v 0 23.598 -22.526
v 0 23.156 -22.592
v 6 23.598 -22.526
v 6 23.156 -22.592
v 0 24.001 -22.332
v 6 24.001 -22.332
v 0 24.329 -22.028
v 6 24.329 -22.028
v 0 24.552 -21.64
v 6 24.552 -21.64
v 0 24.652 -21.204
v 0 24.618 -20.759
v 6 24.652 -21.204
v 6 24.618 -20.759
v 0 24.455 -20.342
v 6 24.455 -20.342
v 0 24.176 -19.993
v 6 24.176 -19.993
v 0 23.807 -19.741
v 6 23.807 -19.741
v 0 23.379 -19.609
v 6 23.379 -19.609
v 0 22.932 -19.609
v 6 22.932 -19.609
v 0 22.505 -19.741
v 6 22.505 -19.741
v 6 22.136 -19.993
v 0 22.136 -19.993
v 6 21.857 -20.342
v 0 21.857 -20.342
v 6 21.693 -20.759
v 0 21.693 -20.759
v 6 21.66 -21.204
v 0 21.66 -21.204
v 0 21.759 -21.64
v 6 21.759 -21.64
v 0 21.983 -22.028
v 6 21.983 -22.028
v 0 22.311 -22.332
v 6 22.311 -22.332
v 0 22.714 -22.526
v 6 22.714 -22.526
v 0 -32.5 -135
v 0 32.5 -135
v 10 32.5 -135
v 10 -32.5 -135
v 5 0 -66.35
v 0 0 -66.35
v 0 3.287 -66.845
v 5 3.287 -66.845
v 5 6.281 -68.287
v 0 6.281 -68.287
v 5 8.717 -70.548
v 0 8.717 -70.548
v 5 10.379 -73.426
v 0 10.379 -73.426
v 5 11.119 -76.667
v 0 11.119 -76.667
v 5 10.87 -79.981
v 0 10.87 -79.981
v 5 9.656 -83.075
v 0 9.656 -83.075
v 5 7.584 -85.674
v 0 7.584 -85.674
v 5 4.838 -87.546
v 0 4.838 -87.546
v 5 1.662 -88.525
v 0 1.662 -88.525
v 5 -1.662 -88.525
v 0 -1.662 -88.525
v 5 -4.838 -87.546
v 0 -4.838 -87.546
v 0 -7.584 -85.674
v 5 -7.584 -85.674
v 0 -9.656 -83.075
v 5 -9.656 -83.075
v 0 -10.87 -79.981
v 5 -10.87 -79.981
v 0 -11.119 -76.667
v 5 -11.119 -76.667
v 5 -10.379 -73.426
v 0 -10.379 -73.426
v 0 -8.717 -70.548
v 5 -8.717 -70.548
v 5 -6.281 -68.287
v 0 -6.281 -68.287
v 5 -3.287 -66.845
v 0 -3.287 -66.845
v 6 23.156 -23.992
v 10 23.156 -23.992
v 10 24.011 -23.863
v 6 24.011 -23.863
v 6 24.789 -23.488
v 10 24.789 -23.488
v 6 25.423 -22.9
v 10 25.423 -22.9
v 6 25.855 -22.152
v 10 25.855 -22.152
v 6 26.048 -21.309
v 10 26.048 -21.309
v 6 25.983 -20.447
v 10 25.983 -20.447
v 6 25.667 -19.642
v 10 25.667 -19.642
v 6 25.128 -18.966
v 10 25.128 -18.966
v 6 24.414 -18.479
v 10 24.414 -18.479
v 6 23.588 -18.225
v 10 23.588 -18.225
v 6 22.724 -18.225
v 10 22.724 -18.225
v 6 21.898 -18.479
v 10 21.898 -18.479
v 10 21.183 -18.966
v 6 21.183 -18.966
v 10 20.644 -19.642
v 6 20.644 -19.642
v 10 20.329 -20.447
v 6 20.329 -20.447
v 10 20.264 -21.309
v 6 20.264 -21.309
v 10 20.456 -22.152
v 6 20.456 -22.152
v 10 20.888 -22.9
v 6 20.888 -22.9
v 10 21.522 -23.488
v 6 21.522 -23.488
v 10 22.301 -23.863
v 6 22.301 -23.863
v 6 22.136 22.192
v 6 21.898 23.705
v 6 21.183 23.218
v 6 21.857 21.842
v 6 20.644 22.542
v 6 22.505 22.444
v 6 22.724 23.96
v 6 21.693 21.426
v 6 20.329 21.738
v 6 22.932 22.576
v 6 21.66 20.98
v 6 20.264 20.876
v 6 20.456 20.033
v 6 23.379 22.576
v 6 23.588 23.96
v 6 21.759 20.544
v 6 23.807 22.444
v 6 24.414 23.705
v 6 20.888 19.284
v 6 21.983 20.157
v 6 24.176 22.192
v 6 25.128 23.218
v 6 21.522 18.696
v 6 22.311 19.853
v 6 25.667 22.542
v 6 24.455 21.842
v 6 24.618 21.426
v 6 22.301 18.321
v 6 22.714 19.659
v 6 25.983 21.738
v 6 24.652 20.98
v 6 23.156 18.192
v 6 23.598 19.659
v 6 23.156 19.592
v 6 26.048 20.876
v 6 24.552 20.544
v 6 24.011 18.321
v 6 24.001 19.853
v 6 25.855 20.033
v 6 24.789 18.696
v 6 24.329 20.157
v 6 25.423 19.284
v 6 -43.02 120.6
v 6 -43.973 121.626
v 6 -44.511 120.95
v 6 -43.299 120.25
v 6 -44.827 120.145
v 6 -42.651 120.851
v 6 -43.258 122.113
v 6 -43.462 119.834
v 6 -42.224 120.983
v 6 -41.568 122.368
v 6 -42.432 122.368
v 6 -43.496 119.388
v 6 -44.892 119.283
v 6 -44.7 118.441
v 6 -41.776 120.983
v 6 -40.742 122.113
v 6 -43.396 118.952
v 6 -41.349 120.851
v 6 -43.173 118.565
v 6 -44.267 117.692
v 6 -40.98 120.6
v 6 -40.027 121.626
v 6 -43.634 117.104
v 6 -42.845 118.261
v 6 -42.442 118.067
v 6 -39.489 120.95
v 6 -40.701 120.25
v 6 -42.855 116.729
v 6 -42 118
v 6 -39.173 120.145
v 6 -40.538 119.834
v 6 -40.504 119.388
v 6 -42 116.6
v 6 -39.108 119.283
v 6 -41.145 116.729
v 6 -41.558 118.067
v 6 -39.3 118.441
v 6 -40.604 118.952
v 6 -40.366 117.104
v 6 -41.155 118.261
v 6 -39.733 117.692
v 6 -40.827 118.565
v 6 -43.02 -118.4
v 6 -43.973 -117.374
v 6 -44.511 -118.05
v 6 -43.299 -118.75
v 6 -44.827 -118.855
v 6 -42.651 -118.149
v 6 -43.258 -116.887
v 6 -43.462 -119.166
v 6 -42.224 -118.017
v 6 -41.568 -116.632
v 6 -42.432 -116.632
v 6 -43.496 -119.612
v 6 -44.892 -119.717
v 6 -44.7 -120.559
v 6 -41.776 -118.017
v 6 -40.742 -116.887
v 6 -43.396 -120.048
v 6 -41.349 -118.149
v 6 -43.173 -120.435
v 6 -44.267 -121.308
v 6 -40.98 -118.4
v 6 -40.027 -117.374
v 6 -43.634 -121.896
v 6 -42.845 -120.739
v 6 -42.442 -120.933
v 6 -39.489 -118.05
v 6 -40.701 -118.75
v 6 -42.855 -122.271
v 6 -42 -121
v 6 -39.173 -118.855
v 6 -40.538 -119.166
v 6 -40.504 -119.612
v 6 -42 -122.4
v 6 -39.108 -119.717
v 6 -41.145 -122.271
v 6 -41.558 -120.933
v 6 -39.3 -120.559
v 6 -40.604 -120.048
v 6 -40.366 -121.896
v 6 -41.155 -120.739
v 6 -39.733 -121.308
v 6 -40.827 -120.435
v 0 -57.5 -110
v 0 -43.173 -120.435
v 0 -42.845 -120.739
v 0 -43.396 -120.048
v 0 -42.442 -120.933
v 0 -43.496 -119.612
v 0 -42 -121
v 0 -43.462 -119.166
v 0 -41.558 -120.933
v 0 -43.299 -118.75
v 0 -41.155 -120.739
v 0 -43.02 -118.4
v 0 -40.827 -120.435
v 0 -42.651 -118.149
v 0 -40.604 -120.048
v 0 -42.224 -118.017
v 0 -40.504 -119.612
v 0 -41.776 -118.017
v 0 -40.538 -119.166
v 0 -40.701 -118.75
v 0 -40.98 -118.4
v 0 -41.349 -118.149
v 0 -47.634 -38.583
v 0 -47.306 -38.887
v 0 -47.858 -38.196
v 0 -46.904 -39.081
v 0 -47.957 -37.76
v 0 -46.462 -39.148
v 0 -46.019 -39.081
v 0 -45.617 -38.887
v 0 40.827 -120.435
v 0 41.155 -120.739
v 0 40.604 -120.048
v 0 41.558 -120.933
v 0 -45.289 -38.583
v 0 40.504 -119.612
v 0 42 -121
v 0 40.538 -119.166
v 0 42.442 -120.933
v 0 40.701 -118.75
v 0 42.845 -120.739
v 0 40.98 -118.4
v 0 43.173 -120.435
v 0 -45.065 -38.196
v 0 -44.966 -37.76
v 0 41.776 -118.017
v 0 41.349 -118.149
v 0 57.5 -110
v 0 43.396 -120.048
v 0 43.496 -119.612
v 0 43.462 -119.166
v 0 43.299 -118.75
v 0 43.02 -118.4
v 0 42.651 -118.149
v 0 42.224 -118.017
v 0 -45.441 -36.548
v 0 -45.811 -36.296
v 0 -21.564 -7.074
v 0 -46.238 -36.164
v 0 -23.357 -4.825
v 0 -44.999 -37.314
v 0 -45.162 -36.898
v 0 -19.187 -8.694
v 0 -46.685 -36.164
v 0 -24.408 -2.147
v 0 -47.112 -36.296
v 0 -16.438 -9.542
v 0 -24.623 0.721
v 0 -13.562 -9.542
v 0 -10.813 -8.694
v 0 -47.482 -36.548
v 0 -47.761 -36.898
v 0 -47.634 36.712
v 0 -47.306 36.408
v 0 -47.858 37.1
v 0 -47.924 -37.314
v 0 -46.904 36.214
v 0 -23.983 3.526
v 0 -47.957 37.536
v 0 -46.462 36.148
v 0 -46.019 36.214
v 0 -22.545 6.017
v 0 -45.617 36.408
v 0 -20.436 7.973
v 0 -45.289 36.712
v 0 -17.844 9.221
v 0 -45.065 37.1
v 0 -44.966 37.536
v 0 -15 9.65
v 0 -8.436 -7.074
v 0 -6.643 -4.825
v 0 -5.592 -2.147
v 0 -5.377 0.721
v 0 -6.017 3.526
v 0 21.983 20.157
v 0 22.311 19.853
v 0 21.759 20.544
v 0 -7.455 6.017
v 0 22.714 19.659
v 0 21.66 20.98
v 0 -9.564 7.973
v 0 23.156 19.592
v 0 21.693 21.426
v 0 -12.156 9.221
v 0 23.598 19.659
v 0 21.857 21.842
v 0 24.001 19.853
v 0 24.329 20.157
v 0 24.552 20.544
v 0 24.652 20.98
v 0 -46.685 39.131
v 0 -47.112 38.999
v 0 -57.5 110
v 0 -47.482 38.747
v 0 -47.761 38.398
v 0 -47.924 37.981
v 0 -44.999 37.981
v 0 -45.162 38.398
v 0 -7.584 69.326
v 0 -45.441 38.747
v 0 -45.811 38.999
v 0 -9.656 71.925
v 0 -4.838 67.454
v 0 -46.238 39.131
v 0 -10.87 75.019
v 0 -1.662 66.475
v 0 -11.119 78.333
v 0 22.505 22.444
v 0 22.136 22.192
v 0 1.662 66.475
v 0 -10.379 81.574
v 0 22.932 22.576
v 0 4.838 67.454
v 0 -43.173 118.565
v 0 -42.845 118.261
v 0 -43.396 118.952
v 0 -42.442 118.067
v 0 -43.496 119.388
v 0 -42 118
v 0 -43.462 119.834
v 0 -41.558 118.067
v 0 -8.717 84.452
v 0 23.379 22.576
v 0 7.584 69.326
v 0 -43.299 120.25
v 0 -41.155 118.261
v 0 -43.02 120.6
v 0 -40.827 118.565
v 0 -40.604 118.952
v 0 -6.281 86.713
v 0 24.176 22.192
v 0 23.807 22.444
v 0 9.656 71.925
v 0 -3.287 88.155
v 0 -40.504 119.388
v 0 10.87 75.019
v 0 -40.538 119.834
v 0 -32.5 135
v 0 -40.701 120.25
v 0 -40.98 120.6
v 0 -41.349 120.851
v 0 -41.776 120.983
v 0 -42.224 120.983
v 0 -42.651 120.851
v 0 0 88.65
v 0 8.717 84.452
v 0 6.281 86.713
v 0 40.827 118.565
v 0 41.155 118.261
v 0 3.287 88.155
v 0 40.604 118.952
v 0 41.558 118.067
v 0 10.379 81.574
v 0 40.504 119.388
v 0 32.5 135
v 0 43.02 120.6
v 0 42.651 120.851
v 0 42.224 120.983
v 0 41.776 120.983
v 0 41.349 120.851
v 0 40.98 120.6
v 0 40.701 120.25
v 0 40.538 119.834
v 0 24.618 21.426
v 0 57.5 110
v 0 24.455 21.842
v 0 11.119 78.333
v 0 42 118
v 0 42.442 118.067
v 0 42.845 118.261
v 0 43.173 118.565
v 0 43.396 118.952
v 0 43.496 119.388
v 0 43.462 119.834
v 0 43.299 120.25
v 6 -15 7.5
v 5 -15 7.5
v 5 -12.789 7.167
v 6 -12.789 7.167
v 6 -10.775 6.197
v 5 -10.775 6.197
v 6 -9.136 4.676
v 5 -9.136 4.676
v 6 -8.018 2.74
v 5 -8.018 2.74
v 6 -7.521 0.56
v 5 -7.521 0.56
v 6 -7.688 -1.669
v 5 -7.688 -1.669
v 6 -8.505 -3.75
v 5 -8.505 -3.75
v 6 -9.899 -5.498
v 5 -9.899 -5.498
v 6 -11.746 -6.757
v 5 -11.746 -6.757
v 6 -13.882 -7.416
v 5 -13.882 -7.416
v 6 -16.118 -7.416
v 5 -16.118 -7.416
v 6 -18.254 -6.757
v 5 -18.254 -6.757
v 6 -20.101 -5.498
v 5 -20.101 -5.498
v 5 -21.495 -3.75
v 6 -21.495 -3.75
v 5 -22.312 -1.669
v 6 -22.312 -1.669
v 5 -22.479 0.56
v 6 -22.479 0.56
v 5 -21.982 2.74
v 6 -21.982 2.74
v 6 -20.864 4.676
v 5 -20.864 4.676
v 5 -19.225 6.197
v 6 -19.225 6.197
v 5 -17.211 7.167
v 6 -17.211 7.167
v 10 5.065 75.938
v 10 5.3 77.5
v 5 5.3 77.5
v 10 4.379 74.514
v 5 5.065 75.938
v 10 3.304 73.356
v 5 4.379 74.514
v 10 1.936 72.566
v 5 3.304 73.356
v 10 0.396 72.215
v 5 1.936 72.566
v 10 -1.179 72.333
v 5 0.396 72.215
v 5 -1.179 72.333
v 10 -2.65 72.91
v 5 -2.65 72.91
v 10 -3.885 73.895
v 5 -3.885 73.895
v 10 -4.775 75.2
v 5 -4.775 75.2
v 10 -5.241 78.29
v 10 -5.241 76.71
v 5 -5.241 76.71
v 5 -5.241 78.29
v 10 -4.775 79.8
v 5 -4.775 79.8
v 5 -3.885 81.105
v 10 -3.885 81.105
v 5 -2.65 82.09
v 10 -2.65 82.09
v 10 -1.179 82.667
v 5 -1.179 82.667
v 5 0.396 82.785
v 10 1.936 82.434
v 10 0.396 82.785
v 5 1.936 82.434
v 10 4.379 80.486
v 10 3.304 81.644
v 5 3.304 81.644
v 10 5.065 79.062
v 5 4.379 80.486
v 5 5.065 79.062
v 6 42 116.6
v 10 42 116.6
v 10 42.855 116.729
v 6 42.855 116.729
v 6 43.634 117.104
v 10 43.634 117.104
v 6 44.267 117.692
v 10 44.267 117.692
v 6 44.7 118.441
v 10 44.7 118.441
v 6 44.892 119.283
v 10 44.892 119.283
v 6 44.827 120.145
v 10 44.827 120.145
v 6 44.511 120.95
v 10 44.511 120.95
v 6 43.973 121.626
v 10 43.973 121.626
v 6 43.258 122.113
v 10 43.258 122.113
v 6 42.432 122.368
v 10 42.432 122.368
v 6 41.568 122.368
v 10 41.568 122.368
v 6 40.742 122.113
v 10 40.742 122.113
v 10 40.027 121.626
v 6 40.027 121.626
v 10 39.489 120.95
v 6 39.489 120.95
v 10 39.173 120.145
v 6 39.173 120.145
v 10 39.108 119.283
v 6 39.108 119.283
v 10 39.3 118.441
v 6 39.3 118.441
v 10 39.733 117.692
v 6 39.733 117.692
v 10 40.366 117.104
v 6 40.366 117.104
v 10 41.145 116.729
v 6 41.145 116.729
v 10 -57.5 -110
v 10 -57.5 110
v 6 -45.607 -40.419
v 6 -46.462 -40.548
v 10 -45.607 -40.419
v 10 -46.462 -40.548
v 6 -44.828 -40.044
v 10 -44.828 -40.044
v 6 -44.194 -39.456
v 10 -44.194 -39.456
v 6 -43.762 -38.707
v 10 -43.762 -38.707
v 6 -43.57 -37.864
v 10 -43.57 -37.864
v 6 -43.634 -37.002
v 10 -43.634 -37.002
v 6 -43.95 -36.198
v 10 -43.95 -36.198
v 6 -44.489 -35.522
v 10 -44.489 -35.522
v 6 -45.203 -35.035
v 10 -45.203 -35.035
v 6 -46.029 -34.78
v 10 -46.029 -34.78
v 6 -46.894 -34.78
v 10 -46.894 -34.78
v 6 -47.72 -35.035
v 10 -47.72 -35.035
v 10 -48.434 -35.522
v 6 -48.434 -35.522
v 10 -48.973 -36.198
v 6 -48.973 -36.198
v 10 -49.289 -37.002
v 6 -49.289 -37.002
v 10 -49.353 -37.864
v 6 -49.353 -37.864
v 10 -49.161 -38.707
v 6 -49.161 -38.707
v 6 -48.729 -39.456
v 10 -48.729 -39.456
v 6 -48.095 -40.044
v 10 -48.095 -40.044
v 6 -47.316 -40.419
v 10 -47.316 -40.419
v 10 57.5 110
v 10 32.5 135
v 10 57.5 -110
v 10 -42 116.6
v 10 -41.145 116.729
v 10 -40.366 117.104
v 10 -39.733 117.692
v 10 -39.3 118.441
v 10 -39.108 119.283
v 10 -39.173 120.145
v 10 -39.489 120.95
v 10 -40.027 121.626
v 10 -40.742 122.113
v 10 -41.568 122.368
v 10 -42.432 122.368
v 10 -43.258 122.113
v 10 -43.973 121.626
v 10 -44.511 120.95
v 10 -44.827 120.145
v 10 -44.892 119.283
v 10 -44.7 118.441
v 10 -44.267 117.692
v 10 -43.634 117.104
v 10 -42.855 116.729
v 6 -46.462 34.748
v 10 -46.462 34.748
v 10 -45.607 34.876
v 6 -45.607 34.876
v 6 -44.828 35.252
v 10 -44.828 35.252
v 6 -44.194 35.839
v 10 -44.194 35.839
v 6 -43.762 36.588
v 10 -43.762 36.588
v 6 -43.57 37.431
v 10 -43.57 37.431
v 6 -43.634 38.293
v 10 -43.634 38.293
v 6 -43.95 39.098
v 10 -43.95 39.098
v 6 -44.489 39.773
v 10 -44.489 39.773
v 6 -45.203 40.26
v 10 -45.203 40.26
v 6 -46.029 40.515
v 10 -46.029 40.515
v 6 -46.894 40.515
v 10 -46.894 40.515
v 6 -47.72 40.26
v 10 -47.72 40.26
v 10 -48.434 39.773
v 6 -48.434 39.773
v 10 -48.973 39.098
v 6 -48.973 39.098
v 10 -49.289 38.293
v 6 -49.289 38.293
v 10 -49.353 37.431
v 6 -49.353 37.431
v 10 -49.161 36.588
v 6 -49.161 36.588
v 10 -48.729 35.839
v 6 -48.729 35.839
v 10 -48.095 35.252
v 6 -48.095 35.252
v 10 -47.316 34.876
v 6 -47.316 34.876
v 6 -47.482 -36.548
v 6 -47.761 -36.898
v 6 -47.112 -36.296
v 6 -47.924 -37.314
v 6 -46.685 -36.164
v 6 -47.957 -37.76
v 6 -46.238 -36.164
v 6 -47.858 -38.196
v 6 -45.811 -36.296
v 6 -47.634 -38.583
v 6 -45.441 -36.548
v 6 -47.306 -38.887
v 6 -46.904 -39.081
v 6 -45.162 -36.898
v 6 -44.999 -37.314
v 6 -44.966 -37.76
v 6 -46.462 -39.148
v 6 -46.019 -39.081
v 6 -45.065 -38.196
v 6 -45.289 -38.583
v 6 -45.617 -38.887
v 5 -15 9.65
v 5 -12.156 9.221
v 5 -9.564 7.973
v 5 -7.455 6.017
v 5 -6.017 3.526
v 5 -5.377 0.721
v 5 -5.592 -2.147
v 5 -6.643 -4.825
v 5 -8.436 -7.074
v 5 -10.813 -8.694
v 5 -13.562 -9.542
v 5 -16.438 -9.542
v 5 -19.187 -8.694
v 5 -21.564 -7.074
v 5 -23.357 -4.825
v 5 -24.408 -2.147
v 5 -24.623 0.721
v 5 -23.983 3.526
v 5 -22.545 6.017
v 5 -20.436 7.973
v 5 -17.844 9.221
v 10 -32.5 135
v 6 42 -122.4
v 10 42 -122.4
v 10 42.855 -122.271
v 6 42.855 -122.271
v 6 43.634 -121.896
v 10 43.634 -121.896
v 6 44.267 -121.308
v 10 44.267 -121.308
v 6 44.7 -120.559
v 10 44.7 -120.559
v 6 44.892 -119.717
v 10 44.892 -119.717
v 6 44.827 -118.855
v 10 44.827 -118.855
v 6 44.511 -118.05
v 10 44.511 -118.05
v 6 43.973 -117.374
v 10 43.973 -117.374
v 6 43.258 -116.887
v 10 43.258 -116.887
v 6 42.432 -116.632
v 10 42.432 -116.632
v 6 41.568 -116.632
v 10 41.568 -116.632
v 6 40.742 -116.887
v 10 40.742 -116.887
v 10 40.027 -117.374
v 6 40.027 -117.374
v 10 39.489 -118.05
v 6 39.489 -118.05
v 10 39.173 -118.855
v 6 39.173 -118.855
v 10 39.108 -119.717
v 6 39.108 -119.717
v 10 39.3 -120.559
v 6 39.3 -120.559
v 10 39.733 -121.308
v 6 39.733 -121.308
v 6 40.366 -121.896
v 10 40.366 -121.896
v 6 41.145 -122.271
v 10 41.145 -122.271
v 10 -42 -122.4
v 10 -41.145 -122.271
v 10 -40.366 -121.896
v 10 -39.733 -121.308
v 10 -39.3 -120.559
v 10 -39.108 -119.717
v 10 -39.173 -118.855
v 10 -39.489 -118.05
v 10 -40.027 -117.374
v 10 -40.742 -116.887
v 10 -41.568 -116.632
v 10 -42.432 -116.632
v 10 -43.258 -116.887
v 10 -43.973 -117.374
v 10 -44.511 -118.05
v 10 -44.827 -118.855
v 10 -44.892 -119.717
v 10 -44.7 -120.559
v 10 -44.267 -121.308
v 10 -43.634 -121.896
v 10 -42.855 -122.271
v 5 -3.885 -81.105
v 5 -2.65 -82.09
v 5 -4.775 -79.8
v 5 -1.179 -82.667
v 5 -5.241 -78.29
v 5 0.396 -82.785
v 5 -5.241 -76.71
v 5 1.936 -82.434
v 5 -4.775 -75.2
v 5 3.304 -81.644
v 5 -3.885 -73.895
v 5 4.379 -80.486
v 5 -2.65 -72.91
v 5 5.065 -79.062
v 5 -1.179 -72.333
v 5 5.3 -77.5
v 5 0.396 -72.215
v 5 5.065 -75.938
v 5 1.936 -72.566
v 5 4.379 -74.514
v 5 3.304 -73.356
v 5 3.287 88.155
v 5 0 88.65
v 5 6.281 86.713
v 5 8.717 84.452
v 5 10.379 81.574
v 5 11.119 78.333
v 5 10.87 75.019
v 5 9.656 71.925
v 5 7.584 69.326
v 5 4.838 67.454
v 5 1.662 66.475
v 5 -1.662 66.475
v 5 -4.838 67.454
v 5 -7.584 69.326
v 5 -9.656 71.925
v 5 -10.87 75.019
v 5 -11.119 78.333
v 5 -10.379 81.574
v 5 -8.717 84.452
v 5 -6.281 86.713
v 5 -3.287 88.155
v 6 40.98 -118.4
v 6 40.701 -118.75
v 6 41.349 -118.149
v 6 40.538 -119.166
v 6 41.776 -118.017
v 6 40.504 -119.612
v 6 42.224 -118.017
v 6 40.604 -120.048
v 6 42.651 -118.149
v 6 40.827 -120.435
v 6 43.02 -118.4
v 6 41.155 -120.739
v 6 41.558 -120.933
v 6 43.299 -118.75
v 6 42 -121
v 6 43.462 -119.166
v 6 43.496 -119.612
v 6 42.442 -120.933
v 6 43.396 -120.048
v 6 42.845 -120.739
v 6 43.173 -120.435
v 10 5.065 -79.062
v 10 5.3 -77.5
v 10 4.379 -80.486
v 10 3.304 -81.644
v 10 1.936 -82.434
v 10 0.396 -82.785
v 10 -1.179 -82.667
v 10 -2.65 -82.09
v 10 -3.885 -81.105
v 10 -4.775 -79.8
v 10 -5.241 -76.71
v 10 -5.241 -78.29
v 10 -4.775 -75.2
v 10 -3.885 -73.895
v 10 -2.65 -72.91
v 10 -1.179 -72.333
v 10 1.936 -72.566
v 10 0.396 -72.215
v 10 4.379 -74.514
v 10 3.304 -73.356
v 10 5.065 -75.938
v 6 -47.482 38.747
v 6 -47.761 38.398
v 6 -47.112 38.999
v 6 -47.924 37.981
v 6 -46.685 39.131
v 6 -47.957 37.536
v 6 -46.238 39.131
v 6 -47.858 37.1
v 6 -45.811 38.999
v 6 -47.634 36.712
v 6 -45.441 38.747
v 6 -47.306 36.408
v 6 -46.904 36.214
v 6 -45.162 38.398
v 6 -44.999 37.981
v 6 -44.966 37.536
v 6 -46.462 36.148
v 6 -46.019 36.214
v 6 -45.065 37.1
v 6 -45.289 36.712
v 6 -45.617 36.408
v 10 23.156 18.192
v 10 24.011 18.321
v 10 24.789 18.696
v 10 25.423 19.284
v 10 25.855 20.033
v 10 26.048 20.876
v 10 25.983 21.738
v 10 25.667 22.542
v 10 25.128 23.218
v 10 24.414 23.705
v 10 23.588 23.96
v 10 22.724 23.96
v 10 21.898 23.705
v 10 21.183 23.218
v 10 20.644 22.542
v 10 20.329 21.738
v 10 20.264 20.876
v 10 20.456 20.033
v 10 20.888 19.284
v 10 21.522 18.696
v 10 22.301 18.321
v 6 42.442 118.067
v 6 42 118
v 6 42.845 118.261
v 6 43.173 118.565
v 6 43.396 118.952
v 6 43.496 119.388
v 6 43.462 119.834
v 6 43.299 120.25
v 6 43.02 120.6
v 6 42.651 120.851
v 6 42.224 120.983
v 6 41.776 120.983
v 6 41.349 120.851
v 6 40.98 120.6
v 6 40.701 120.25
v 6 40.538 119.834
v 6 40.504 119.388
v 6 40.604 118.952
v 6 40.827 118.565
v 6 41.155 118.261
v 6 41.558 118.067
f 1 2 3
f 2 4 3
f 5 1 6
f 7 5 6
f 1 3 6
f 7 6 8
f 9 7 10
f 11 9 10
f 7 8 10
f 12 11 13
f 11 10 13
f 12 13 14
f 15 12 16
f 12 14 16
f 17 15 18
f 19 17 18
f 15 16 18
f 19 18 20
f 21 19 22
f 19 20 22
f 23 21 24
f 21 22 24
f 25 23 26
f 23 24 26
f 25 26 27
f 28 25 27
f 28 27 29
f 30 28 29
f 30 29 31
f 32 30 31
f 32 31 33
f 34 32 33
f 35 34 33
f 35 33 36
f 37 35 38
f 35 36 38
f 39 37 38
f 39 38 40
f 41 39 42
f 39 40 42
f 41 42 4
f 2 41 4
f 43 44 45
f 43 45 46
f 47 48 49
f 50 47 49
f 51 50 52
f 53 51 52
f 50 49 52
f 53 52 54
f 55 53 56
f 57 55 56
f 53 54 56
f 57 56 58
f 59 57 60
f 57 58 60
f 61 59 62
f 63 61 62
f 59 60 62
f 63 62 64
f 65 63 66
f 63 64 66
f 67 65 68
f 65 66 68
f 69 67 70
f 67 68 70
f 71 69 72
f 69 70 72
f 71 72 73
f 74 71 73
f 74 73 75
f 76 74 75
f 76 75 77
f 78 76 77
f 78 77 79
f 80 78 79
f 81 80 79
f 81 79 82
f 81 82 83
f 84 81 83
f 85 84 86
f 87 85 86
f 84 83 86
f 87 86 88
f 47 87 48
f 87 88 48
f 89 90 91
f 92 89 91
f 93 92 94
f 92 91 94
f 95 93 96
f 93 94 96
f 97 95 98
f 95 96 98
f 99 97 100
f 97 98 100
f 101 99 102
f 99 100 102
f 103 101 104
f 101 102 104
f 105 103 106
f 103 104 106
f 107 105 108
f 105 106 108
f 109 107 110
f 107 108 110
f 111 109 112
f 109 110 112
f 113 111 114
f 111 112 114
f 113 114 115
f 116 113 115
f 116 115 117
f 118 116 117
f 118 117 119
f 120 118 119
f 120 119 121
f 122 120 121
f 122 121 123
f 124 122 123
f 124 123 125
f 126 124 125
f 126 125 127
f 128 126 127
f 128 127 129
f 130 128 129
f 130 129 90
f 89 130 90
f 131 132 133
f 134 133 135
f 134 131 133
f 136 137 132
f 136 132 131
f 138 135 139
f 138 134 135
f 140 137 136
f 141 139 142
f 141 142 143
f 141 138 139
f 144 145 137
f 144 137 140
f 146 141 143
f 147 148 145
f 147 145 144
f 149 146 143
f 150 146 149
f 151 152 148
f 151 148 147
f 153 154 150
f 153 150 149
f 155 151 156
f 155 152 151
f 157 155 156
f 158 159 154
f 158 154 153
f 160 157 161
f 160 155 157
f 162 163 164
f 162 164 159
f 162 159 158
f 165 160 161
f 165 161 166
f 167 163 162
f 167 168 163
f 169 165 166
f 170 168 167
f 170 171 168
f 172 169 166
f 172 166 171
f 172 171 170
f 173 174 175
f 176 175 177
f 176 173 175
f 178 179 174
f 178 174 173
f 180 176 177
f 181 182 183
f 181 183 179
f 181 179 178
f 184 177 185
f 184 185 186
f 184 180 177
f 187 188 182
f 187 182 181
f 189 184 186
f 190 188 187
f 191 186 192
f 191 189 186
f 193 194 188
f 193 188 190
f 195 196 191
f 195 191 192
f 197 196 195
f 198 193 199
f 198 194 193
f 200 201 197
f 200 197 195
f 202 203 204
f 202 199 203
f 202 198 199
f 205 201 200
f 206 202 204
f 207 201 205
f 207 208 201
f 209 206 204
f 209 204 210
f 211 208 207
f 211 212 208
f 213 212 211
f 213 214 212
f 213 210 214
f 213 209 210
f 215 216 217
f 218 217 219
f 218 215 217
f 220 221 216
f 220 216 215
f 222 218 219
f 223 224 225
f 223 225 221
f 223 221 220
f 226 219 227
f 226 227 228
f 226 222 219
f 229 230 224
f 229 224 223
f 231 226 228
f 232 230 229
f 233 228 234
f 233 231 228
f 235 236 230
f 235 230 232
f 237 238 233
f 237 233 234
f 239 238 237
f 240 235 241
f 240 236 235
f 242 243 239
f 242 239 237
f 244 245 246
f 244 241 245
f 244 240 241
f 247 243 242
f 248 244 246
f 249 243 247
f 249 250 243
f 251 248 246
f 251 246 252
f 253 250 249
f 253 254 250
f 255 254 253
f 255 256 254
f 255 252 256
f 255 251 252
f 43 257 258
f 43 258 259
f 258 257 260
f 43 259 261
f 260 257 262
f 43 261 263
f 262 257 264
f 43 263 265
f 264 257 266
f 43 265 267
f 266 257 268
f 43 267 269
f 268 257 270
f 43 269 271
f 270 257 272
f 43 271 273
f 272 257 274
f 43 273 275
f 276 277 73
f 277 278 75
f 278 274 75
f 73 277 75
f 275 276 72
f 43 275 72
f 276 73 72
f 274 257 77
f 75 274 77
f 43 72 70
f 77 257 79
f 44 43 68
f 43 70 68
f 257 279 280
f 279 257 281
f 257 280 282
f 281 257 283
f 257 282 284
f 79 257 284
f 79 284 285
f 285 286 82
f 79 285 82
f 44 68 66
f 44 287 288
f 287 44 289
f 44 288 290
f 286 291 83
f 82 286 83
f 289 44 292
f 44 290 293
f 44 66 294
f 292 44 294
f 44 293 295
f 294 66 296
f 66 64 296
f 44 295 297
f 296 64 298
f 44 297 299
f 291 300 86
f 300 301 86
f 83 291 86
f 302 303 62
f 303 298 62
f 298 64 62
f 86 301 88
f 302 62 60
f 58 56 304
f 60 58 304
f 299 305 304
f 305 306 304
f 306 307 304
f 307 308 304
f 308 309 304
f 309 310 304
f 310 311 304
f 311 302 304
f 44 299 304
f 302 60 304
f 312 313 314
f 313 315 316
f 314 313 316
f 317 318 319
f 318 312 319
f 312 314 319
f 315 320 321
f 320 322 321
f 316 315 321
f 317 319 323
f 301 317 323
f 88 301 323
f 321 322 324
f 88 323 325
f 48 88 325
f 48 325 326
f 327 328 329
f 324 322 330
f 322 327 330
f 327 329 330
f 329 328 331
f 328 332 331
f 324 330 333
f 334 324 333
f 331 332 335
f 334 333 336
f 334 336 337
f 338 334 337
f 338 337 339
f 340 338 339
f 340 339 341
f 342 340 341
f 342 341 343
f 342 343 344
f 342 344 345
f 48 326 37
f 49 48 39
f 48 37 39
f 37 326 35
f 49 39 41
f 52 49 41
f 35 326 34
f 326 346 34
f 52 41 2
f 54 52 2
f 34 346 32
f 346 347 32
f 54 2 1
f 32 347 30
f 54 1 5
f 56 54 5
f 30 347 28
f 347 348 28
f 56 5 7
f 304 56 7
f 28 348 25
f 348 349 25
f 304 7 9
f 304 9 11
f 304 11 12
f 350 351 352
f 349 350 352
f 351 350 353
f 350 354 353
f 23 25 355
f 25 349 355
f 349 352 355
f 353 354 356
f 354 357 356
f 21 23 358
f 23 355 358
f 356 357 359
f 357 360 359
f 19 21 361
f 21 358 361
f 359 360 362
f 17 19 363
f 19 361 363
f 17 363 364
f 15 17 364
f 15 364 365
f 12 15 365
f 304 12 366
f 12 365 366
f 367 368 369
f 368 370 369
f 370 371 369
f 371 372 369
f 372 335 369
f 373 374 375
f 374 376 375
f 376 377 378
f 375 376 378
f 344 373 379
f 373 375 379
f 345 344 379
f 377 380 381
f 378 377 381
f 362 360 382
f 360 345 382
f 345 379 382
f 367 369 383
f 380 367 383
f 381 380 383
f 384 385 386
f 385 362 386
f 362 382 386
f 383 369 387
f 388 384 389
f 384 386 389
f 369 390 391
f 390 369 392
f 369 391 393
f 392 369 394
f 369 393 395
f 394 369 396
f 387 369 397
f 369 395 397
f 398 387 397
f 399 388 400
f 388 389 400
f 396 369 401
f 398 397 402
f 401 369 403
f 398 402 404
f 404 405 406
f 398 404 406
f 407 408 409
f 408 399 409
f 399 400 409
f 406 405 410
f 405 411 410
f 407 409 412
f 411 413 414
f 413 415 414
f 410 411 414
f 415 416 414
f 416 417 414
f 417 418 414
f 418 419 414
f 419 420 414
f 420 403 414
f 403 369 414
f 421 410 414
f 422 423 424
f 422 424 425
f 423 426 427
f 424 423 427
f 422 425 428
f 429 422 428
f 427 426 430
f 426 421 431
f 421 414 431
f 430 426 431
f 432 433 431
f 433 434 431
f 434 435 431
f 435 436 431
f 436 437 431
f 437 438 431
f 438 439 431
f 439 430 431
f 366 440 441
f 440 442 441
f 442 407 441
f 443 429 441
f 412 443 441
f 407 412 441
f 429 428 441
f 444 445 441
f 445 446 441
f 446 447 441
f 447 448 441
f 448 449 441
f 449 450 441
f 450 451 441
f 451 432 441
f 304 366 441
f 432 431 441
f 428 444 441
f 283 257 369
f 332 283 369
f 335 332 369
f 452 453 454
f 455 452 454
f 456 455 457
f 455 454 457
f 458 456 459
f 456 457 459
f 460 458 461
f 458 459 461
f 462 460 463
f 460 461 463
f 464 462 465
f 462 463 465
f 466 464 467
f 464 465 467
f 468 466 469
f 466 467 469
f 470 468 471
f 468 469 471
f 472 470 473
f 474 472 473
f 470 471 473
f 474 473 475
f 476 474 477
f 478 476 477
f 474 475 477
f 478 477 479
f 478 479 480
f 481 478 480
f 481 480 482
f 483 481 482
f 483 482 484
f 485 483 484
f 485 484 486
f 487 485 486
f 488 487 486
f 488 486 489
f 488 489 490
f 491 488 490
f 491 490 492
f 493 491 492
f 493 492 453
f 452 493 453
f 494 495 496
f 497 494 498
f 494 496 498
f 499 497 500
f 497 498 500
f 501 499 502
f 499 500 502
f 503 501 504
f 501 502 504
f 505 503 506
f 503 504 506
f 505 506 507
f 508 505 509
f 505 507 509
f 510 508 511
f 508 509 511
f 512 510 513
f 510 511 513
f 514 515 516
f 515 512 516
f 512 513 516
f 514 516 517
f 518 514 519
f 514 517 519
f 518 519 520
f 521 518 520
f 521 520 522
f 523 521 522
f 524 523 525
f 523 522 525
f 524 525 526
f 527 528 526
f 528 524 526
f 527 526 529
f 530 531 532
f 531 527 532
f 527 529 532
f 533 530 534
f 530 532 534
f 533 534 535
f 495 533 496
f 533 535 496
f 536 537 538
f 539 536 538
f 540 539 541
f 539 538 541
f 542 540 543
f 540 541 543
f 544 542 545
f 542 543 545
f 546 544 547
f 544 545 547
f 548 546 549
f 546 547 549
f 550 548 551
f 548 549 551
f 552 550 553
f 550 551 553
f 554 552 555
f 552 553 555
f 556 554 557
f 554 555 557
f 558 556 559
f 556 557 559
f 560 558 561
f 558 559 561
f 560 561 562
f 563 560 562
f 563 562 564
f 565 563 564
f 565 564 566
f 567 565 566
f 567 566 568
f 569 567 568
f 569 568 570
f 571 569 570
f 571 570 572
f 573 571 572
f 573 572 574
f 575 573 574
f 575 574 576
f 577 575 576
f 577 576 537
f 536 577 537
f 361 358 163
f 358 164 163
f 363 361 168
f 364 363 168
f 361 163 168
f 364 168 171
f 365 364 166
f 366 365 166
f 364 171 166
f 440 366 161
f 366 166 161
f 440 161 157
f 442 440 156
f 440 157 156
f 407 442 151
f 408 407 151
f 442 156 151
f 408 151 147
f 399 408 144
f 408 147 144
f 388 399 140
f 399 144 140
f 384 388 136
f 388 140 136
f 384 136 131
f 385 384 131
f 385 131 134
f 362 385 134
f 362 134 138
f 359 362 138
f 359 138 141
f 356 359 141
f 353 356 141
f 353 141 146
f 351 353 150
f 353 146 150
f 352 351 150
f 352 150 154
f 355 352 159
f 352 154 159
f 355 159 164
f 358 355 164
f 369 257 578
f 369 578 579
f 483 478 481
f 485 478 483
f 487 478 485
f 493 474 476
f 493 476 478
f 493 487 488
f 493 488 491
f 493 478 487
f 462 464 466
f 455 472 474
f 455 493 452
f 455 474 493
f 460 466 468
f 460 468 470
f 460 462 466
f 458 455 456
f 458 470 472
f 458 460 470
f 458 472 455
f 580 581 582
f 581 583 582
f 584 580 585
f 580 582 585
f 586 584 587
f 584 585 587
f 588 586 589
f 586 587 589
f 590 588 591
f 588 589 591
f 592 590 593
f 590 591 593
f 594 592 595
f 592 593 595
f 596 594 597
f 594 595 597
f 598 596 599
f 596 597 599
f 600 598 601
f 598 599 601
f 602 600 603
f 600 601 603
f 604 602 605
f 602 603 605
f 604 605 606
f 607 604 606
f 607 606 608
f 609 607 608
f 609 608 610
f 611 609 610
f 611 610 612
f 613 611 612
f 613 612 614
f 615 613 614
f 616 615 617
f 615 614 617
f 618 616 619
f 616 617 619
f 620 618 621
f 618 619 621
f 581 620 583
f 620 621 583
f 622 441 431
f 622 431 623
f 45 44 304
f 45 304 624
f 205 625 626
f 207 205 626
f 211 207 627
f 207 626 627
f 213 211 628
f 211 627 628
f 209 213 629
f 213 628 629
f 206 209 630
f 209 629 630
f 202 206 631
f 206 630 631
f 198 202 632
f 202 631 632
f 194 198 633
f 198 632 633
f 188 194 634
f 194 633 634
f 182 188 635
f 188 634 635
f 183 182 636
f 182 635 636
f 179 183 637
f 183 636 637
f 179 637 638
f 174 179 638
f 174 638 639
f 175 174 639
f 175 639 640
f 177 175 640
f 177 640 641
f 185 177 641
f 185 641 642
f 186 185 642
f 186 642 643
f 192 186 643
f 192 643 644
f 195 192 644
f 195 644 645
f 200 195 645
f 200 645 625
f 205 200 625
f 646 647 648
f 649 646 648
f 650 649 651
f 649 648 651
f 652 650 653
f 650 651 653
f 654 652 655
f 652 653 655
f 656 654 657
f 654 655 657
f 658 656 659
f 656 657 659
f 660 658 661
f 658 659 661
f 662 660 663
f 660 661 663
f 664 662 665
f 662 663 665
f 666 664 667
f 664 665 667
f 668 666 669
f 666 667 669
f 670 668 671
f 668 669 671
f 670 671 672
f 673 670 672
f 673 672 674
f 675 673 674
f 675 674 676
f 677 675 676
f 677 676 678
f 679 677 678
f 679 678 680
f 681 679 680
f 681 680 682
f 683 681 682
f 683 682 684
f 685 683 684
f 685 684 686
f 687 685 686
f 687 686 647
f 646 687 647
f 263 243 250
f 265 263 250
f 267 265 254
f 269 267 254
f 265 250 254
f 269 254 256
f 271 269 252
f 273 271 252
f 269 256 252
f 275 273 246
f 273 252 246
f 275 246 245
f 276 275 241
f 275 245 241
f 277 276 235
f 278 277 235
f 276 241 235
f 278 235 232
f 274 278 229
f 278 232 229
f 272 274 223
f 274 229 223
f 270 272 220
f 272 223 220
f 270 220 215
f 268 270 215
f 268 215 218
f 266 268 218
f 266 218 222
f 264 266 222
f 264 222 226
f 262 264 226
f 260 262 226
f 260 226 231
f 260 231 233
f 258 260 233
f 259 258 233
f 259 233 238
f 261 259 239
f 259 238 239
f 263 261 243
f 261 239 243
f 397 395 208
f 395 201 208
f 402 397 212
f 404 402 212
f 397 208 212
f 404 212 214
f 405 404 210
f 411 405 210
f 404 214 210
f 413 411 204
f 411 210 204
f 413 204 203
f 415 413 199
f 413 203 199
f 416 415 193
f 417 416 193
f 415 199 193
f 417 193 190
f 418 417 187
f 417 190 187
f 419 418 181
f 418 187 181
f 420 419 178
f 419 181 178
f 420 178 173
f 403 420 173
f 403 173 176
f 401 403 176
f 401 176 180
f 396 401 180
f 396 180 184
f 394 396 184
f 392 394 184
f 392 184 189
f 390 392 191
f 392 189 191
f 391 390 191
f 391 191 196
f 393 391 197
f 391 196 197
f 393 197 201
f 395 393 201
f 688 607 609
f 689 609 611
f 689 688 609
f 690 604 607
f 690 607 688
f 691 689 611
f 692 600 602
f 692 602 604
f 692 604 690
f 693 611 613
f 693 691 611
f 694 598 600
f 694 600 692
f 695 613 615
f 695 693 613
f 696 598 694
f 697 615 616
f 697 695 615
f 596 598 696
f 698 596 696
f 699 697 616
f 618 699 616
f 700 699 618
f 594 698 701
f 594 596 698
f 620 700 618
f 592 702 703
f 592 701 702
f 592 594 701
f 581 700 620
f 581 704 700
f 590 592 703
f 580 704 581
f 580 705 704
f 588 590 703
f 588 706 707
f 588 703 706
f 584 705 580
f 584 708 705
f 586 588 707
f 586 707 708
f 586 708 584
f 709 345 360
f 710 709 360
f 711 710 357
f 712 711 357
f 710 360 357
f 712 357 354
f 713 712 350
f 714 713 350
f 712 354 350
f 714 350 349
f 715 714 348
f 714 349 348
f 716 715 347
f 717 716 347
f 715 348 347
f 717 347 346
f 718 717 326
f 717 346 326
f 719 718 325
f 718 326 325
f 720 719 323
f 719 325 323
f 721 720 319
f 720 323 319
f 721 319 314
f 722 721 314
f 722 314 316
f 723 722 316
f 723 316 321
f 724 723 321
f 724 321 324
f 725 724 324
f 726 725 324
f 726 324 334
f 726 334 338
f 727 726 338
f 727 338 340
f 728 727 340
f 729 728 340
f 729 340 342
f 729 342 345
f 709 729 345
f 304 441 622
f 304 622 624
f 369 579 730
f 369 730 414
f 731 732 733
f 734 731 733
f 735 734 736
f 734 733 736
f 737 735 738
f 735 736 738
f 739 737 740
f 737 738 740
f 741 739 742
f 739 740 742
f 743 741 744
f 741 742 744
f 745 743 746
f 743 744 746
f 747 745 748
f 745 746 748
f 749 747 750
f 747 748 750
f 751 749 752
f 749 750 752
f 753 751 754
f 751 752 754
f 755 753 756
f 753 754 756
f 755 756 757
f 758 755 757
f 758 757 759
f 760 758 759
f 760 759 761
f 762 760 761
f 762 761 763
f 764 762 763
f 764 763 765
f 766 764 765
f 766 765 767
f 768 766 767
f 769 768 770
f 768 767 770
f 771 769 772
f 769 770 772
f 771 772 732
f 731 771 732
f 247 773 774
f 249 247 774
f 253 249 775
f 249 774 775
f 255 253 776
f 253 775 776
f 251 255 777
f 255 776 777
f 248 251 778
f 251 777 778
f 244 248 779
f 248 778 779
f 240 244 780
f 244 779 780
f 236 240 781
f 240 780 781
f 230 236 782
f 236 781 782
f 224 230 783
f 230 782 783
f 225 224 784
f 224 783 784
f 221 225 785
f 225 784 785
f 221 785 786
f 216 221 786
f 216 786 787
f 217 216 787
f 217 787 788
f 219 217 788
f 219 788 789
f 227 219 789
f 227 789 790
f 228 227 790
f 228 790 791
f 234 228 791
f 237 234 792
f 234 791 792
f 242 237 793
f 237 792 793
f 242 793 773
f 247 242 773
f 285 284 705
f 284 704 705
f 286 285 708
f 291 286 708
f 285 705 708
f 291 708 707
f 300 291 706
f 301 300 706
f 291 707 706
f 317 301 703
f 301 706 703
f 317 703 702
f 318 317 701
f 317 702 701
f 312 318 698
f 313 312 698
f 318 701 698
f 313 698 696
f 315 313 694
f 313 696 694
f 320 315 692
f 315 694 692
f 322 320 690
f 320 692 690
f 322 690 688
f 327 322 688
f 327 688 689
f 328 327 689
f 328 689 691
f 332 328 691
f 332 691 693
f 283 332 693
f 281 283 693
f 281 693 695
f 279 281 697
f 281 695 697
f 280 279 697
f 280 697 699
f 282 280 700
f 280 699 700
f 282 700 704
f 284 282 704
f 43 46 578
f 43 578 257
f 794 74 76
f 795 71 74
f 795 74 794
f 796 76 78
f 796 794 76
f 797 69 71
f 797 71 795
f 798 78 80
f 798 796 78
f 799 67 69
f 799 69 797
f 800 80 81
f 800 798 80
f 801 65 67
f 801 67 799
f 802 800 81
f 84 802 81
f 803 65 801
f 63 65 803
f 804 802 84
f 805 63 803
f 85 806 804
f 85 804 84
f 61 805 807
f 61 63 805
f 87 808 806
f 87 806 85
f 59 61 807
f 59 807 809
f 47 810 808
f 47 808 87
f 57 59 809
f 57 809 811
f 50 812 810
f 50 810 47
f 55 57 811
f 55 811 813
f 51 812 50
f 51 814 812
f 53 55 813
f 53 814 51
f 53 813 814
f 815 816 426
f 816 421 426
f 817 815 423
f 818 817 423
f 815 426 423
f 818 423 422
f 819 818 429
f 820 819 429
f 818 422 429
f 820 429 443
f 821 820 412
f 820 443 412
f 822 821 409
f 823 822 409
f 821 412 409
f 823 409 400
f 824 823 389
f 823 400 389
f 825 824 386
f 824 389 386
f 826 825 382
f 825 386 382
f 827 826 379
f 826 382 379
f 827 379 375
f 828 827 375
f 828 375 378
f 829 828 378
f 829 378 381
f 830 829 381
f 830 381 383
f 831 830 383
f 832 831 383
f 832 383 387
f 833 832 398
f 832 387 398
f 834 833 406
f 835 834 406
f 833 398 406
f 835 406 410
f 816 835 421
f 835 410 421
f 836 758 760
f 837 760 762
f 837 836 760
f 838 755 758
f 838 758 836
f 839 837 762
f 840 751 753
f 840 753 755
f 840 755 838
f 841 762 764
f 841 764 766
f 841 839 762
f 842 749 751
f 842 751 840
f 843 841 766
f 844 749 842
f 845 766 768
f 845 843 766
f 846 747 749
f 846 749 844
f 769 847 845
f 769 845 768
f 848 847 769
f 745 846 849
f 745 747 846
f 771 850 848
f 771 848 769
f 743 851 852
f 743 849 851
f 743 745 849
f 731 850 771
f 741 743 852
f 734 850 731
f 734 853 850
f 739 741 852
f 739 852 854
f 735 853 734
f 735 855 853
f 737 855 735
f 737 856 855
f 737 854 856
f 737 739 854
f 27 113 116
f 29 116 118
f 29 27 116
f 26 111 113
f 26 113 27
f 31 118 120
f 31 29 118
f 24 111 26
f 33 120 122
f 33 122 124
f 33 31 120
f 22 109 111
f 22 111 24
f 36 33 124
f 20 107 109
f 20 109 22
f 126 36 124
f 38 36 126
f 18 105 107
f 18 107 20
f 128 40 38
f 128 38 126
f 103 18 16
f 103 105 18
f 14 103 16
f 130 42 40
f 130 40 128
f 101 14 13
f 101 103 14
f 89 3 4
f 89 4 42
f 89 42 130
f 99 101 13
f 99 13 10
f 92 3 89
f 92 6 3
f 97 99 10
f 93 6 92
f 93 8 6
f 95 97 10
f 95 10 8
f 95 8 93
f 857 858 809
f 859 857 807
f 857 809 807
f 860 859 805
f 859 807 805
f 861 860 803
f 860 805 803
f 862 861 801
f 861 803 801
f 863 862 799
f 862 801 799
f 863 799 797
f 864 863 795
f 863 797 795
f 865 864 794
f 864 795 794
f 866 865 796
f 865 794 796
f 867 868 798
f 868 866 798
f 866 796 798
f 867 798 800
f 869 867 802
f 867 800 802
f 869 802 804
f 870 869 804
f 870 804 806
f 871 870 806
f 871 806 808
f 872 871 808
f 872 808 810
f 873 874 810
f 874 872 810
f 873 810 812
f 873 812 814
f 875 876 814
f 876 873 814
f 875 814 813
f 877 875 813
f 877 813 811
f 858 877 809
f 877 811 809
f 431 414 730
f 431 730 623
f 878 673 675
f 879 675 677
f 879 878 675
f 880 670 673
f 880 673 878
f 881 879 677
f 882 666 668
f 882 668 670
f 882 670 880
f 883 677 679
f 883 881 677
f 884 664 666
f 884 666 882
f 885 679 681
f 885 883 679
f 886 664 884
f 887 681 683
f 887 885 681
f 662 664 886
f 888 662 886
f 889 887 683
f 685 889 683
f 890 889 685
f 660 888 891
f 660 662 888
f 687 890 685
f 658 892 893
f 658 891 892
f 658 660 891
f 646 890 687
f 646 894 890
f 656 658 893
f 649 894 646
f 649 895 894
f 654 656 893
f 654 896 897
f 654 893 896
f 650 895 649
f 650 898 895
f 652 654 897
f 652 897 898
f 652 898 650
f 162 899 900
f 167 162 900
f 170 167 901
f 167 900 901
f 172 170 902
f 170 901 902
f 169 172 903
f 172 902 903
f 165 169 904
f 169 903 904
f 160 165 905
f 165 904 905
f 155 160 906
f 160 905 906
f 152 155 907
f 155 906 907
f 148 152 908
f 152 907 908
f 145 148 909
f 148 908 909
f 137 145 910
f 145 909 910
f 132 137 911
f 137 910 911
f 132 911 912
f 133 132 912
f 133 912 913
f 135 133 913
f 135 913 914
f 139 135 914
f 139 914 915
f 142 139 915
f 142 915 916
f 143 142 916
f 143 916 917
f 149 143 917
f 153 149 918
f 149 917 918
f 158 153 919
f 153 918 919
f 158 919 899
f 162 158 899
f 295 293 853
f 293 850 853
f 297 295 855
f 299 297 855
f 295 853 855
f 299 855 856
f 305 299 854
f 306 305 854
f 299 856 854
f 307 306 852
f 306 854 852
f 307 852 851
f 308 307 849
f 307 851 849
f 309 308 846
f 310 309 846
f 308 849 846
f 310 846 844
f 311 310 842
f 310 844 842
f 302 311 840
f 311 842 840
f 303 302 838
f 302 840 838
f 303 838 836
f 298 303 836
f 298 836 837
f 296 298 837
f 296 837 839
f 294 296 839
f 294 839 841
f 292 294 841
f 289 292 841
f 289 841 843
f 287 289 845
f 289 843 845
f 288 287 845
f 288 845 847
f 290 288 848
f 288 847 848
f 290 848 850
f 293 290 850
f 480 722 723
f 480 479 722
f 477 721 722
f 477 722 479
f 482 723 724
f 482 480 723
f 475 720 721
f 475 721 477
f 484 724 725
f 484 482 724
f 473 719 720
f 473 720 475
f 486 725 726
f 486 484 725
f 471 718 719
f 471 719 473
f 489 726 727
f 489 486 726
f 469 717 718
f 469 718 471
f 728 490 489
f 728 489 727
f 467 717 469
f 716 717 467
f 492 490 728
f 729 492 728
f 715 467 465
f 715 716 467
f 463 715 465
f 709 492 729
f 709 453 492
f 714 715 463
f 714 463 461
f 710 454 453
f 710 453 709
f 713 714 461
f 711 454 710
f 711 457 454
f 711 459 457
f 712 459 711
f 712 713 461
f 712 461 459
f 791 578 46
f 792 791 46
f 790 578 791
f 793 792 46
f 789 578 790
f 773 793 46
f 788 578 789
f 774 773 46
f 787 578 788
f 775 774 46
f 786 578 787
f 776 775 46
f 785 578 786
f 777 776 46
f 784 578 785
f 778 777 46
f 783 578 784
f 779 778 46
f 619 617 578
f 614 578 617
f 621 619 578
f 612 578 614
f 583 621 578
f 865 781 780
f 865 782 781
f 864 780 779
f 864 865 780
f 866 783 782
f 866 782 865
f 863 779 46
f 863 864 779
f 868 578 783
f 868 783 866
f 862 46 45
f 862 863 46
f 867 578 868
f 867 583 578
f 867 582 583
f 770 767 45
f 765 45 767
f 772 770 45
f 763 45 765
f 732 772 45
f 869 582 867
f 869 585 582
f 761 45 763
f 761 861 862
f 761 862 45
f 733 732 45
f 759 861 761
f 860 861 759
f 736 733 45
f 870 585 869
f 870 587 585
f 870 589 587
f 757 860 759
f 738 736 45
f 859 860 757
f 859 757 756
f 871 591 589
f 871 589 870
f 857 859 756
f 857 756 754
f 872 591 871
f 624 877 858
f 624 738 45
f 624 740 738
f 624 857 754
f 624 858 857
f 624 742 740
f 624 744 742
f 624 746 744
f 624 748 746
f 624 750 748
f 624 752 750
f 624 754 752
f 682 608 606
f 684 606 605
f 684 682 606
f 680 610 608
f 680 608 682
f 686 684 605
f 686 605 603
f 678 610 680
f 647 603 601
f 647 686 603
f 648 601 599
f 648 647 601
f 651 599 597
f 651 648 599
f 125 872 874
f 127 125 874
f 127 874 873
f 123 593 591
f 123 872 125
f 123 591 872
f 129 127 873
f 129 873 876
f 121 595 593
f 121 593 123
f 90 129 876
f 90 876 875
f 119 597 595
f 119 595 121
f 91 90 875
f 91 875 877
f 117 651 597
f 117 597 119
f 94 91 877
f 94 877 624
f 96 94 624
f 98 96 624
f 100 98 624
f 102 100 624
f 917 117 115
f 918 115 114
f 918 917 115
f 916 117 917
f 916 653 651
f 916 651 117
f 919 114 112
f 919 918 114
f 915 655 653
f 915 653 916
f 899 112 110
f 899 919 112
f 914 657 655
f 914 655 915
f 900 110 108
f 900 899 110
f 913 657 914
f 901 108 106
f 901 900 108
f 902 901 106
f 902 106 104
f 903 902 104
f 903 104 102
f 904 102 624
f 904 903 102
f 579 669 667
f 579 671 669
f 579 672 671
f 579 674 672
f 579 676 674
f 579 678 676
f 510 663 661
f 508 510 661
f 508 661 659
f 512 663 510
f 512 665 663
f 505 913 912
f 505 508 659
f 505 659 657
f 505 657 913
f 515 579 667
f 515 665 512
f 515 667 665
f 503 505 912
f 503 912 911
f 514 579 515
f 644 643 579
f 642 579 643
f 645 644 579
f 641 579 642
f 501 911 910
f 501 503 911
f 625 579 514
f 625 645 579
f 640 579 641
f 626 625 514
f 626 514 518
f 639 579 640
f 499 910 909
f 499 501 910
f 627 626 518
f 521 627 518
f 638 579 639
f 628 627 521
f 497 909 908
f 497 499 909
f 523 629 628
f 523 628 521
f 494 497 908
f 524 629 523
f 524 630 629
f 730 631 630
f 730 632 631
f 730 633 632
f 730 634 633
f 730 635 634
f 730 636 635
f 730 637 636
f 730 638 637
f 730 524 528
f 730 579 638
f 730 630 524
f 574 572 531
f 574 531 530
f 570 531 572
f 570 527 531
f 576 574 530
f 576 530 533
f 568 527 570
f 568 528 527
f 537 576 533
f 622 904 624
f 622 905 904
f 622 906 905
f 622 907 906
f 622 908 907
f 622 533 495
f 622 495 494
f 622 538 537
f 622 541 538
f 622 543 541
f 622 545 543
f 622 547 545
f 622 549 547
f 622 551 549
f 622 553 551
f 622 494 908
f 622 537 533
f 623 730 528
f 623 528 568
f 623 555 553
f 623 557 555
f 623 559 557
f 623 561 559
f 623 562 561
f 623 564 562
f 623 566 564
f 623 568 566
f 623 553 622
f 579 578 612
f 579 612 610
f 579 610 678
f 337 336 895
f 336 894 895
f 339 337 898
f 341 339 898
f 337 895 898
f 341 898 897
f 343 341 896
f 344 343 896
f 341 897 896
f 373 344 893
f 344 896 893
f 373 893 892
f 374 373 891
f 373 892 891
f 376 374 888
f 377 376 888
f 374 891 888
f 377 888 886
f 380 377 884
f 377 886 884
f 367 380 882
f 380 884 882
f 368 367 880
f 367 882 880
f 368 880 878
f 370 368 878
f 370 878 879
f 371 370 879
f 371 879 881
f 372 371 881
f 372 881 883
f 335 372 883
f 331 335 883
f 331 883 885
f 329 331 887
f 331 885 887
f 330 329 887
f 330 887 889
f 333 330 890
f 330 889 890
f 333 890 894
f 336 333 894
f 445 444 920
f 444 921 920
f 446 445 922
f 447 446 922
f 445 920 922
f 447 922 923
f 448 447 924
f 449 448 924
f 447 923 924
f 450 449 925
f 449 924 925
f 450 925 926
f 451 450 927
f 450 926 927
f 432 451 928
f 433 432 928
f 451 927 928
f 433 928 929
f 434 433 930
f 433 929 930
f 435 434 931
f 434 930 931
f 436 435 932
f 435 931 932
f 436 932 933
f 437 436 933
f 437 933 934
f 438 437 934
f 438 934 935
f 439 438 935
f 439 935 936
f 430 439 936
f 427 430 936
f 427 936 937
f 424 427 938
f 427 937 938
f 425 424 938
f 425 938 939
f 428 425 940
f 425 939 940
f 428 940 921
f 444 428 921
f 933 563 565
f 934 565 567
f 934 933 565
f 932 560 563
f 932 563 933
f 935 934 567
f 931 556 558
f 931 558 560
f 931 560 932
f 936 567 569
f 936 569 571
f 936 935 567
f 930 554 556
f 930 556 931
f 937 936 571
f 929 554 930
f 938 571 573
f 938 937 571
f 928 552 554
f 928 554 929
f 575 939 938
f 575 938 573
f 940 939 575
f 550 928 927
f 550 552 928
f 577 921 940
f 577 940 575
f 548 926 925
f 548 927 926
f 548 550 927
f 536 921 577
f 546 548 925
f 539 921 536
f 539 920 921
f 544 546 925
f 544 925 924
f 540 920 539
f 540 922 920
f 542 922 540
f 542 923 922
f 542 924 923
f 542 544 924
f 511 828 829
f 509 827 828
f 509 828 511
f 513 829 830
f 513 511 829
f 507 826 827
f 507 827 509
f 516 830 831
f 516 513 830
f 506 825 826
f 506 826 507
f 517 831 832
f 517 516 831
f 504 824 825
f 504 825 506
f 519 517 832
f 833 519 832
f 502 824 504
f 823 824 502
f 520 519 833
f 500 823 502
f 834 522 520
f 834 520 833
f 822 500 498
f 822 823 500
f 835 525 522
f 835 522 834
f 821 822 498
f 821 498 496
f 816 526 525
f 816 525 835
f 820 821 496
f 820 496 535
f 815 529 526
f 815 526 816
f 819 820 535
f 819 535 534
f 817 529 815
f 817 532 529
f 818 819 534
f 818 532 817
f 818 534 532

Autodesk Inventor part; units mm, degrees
ref_plane "YZ Plane" through (0, 0, 0) normal (1, 0, 0) x (0, 1, 0)
ref_plane "XZ Plane" through (0, 0, 0) normal (0, 1, 0) x (-1, 0, 0)
ref_plane "XY Plane" through (0, 0, 0) normal (0, 0, 1) x (1, 0, 0)
sketch "Sketch1" plane through (0, 0, 0) normal (1, 0, 0) x (0, 1, 0)
  line L0 (-57.5, 135) -> (57.5, 135)
  line L1 (57.5, 135) -> (57.5, -135)
  line L2 (57.5, -135) -> (-57.5, -135)
  line L3 (-57.5, -135) -> (-57.5, 135)
  line L4 (-57.5, 135) -> (57.5, -135) construction
  line L5 (57.5, 135) -> (-57.5, -135) construction
  circle A0 centre (0, 77.5) radius 5.3
  circle A1 centre (0, -77.5) radius 5.3
  circle A2 centre (0, 0) radius 5.3
  line L6 (0, 77.5) -> (0, -77.5) construction
  line L7 (51.5, -129) -> (51.5, 129)
  line L8 (51.5, 129) -> (-51.5, 129)
  line L9 (-51.5, 129) -> (-51.5, -129)
  line L10 (-51.5, -129) -> (51.5, -129)
  dimension "d0" = 155
  dimension "d1" = 10.6
  dimension "d2" = 270
  dimension "d3" = 115
  dimension "d4" = 6
extrude "Extrusion1" add sketch "Sketch1" along normal blind 10 contours L0 L1 L2 L3 | A2 | L10 L9 L8 L7
chamfer "Chamfer2" distance 25 angle 45 4 edges at (5, 57.5, -135) (5, -57.5, -135) (5, -57.5, 135) (5, 57.5, 135)
sketch "Sketch11" plane through (0, 0, 0) normal (-1, 0, 0) x (0, 0, 1)
  circle A0 centre (-77.5, 0) radius 5.3 projected
  circle A1 centre (77.5, 0) radius 5.3 projected
  circle A2 centre (-77.5, 0) radius 11.15
  circle A3 centre (77.5, 0) radius 11.15
  point P0 (0, 0)
  dimension "d41" = 22.3
extrude "Extrusion10" cut sketch "Sketch11" against normal blind 5 contours A0 | A1 | A2 | A3
sketch "Sketch12" plane through (0, 0, 0) normal (-1, 0, 0) x (0, 0, 1)
  circle A0 centre (0, -15) radius 9.65
  point P0 (0, 0)
  dimension "d44" = 15
  dimension "d45" = 19.3
extrude "Extrusion11" cut sketch "Sketch12" against normal blind 5
sketch "Sketch13" plane through (5, -15, 0) normal (-1, 0, 0) x (0, 0, 1)
  circle A0 centre (0, 0) radius 9.65 projected
  circle A1 centre (0, 0) radius 7.5
  point P0 (0, 15)
  dimension "d48" = 15
extrude "Extrusion12" cut sketch "Sketch13" against normal blind 1 contours A1
sketch "Sketch14" plane through (10, 0, 0) normal (1, 0, 0) x (0, 0, -1)
  circle A0 centre (-119.5, 42) radius 1.5
  circle A1 centre (-119.5, -42) radius 1.5
  circle A2 centre (-37.6476, -46.4615) radius 1.5
  circle A3 centre (37.6476, -46.4615) radius 1.5
  circle A4 centre (-21.0923, 23.1558) radius 1.5
  circle A5 centre (21.0923, 23.1558) radius 1.5
  circle A6 centre (119.5, -42) radius 1.5
  circle A7 centre (119.5, 42) radius 1.5
  point P0 (0, 0)
extrude "Extrusion13" cut sketch "Sketch14" against normal through all
sketch "Sketch15" plane through (10, 0, 0) normal (1, 0, 0) x (0, 0, -1)
  circle A0 centre (-21.0923, 23.1558) radius 1.5 projected
  circle A1 centre (119.5, -42) radius 1.5 projected
  circle A2 centre (-119.5, -42) radius 1.5 projected
  circle A3 centre (37.6476, -46.4615) radius 1.5 projected
  circle A4 centre (-37.6476, -46.4615) radius 1.5 projected
  circle A5 centre (-119.5, 42) radius 1.5 projected
  circle A6 centre (21.0923, 23.1558) radius 1.5 projected
  circle A7 centre (119.5, 42) radius 1.5 projected
  line L0 (-135, 32.5) -> (-110, 57.5) projected
  line L1 (-135, 32.5) -> (-135, -32.5) projected
  line L2 (-110, -57.5) -> (-135, -32.5) projected
  line L3 (-110, -57.5) -> (110, -57.5) projected
  line L4 (135, -32.5) -> (110, -57.5) projected
  line L5 (135, -32.5) -> (135, 32.5) projected
  line L6 (110, 57.5) -> (135, 32.5) projected
  line L7 (110, 57.5) -> (-110, 57.5) projected
  circle A8 centre (-77.5, 0) radius 5.3 projected
  circle A9 centre (77.5, 0) radius 5.3 projected
  circle A10 centre (-119.5, 42) radius 2.9
  circle A11 centre (-119.5, -42) radius 2.9
  circle A12 centre (-37.6476, -46.4615) radius 2.9
  circle A13 centre (37.6476, -46.4615) radius 2.9
  circle A14 centre (119.5, -42) radius 2.9
  circle A15 centre (119.5, 42) radius 2.9
  circle A16 centre (21.0923, 23.1558) radius 2.9
  circle A17 centre (-21.0923, 23.1558) radius 2.9
  point P0 (0, 0)
  dimension "d53" = 5.8
extrude "Extrusion14" cut sketch "Sketch15" against normal blind 4 contours A0 | A1 | A2 | A3 | A4 | A5 | A6 | A7 | A10 | A11 | A12 | A13 | A14 | A15 | A16 | A17
properties part number "CAJA" material "Steel, Mild, Welded"
